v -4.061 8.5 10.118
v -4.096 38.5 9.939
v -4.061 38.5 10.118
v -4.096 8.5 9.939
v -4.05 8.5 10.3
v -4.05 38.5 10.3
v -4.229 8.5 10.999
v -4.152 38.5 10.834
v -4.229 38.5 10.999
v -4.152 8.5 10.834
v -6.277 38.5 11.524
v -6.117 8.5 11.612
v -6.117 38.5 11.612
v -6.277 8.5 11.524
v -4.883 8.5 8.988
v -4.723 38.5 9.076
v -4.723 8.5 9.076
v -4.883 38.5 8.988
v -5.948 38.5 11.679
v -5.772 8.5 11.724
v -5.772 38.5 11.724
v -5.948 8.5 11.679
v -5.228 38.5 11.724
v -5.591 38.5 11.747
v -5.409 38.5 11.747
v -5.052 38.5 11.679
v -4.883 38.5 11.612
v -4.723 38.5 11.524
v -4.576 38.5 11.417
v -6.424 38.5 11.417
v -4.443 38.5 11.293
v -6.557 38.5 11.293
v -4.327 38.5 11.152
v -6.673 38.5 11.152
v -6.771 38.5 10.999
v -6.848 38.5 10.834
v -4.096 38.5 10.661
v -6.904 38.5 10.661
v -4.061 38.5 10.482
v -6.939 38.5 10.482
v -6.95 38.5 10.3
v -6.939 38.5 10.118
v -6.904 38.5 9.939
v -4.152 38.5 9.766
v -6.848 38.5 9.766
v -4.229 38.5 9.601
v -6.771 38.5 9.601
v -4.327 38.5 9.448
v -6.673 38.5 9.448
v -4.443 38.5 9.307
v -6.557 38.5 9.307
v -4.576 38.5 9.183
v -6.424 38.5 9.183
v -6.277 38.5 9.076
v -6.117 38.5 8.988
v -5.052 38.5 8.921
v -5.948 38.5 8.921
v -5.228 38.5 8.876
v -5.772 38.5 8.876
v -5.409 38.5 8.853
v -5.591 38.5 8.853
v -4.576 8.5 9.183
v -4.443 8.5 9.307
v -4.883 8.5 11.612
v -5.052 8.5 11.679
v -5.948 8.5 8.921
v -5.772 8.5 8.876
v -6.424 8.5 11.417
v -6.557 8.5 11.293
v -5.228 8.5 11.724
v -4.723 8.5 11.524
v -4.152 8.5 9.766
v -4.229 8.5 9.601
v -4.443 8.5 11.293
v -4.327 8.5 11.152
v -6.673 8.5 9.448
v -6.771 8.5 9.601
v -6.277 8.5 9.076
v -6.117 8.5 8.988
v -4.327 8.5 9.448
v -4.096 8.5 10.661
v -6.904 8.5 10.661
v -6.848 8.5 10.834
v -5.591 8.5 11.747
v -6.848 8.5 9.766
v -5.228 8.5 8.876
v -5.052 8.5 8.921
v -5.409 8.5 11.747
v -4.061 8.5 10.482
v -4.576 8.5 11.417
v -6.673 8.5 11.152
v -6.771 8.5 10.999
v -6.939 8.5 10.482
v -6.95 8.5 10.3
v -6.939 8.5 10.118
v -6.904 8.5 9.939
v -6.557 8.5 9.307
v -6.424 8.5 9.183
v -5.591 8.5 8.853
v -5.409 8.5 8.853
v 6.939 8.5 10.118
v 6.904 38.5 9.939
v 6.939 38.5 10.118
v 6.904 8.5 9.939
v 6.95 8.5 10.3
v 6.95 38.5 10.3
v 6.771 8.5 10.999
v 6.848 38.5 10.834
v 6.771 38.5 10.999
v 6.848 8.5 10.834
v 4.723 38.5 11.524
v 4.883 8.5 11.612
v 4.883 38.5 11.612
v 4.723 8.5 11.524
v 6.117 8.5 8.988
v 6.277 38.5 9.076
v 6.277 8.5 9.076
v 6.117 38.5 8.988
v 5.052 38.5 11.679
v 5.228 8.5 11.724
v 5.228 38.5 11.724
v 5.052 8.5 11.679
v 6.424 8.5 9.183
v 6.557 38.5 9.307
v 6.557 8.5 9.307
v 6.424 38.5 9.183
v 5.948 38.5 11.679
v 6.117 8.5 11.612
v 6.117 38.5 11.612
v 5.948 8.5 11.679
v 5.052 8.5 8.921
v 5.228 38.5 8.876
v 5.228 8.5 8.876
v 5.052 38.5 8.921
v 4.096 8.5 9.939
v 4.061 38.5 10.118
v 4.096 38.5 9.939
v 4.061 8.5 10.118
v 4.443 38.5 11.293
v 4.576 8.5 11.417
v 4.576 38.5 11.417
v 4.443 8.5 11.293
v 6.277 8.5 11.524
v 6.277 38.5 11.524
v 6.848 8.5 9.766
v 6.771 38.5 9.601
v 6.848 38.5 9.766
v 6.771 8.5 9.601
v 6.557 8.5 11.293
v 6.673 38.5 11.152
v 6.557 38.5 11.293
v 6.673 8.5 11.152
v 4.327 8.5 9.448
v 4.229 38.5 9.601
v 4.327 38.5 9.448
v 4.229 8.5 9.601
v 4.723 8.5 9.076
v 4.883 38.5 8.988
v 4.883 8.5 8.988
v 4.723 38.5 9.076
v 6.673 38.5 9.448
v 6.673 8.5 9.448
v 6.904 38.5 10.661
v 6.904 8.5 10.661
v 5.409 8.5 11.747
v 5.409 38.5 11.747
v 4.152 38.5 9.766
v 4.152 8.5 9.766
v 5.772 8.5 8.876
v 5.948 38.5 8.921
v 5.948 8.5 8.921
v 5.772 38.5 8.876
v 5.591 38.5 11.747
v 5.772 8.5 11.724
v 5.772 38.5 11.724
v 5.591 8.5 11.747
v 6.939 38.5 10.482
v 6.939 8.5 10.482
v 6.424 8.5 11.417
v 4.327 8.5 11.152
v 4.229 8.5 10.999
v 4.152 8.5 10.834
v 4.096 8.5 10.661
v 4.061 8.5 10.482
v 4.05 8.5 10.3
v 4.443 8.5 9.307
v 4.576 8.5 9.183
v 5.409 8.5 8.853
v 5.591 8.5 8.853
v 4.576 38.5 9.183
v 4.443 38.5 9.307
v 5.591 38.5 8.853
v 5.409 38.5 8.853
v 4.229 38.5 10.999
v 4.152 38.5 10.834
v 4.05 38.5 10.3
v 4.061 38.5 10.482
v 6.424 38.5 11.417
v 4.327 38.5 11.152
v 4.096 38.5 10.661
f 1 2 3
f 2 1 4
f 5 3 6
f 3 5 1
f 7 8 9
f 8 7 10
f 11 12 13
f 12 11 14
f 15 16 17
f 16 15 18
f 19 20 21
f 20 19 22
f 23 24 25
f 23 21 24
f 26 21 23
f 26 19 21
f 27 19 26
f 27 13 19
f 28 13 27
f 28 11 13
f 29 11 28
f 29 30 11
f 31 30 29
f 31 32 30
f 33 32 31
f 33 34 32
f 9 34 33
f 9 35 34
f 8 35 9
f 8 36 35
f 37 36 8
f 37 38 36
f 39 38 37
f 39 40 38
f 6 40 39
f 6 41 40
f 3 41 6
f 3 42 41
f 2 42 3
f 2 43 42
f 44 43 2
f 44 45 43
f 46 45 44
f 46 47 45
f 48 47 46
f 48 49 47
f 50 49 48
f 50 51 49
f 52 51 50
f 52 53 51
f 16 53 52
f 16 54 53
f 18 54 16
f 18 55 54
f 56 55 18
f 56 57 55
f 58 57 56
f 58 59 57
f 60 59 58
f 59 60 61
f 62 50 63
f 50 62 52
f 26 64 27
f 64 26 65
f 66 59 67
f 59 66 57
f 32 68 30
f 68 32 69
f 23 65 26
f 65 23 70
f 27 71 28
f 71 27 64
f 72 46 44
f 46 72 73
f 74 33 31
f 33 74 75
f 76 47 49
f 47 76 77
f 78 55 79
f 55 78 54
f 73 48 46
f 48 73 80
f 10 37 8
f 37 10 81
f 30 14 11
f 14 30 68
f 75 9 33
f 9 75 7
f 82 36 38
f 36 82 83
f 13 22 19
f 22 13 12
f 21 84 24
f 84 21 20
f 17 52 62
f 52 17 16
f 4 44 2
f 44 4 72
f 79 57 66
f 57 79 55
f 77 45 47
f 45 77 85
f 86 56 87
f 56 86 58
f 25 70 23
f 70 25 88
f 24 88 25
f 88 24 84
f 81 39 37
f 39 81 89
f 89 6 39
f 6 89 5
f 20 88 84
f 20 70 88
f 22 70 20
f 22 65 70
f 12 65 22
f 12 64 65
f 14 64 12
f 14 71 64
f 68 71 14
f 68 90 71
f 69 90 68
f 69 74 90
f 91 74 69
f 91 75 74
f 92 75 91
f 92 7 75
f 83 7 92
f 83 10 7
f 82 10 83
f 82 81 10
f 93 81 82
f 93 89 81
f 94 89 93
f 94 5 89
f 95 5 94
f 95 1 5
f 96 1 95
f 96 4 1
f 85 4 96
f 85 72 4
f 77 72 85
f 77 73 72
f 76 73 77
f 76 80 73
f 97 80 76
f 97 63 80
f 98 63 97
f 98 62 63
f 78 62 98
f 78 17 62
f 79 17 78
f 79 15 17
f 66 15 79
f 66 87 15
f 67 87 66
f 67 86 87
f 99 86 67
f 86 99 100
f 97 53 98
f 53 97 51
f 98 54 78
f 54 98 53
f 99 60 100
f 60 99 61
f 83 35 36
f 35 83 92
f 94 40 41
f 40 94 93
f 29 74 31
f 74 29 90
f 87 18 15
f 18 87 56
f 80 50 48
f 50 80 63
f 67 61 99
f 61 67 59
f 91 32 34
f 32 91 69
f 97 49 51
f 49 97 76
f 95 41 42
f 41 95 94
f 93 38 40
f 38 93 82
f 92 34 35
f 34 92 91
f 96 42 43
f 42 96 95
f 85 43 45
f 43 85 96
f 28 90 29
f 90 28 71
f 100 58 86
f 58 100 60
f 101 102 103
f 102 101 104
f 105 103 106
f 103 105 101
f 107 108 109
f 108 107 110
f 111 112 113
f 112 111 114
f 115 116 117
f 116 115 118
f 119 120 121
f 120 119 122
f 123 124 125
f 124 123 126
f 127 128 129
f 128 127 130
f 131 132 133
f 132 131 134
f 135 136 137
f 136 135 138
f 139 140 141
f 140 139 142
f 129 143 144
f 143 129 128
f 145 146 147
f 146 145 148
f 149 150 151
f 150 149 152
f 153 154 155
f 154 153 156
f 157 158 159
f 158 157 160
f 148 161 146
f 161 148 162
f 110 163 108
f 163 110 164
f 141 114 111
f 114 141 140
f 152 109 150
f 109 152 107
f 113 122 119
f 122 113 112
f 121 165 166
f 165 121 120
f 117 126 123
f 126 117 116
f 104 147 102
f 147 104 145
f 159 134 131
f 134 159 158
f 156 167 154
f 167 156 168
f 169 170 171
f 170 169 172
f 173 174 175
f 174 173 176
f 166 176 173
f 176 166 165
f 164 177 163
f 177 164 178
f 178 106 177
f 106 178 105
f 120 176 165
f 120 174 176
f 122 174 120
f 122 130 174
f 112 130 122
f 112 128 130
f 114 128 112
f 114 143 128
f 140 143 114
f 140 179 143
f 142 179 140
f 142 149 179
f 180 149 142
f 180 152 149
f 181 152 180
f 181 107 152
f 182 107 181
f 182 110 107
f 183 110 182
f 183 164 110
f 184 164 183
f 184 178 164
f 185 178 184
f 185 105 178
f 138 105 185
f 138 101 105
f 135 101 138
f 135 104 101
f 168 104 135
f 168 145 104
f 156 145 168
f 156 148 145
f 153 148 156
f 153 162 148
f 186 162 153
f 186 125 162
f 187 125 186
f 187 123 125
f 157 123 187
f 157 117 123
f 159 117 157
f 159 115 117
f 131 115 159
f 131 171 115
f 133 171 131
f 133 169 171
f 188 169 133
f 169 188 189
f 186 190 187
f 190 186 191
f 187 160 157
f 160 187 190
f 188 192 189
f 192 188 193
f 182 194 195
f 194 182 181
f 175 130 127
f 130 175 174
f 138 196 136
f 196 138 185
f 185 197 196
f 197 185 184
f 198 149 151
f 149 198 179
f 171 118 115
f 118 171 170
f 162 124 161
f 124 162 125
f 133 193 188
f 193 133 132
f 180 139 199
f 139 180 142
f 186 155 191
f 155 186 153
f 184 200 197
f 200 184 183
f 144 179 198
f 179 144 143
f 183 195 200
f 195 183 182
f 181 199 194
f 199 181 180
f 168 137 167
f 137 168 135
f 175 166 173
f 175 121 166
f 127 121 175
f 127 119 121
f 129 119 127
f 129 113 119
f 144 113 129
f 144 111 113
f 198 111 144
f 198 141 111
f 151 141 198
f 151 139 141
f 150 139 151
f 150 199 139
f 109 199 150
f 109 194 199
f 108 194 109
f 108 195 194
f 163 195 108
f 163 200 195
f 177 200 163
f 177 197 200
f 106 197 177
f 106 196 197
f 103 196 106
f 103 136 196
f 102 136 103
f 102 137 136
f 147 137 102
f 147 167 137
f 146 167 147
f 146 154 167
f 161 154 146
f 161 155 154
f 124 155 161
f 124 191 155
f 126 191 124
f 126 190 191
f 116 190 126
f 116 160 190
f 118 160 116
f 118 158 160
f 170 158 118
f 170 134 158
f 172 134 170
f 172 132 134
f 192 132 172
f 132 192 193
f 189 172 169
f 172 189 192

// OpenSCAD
$fn = 50;

difference() {
	union() {
		translate(v = [-5.5, 8.5, 10.3]) {
			rotate(a = [-90, 0, 0]) {
				cylinder(h = 30, r = 1.45);
			}
		}
		translate(v = [5.5, 8.5, 10.3]) {
			rotate(a = [-90, 0, 0]) {
				cylinder(h = 30, r = 1.45);
			}
		}
	}
	union();
}
